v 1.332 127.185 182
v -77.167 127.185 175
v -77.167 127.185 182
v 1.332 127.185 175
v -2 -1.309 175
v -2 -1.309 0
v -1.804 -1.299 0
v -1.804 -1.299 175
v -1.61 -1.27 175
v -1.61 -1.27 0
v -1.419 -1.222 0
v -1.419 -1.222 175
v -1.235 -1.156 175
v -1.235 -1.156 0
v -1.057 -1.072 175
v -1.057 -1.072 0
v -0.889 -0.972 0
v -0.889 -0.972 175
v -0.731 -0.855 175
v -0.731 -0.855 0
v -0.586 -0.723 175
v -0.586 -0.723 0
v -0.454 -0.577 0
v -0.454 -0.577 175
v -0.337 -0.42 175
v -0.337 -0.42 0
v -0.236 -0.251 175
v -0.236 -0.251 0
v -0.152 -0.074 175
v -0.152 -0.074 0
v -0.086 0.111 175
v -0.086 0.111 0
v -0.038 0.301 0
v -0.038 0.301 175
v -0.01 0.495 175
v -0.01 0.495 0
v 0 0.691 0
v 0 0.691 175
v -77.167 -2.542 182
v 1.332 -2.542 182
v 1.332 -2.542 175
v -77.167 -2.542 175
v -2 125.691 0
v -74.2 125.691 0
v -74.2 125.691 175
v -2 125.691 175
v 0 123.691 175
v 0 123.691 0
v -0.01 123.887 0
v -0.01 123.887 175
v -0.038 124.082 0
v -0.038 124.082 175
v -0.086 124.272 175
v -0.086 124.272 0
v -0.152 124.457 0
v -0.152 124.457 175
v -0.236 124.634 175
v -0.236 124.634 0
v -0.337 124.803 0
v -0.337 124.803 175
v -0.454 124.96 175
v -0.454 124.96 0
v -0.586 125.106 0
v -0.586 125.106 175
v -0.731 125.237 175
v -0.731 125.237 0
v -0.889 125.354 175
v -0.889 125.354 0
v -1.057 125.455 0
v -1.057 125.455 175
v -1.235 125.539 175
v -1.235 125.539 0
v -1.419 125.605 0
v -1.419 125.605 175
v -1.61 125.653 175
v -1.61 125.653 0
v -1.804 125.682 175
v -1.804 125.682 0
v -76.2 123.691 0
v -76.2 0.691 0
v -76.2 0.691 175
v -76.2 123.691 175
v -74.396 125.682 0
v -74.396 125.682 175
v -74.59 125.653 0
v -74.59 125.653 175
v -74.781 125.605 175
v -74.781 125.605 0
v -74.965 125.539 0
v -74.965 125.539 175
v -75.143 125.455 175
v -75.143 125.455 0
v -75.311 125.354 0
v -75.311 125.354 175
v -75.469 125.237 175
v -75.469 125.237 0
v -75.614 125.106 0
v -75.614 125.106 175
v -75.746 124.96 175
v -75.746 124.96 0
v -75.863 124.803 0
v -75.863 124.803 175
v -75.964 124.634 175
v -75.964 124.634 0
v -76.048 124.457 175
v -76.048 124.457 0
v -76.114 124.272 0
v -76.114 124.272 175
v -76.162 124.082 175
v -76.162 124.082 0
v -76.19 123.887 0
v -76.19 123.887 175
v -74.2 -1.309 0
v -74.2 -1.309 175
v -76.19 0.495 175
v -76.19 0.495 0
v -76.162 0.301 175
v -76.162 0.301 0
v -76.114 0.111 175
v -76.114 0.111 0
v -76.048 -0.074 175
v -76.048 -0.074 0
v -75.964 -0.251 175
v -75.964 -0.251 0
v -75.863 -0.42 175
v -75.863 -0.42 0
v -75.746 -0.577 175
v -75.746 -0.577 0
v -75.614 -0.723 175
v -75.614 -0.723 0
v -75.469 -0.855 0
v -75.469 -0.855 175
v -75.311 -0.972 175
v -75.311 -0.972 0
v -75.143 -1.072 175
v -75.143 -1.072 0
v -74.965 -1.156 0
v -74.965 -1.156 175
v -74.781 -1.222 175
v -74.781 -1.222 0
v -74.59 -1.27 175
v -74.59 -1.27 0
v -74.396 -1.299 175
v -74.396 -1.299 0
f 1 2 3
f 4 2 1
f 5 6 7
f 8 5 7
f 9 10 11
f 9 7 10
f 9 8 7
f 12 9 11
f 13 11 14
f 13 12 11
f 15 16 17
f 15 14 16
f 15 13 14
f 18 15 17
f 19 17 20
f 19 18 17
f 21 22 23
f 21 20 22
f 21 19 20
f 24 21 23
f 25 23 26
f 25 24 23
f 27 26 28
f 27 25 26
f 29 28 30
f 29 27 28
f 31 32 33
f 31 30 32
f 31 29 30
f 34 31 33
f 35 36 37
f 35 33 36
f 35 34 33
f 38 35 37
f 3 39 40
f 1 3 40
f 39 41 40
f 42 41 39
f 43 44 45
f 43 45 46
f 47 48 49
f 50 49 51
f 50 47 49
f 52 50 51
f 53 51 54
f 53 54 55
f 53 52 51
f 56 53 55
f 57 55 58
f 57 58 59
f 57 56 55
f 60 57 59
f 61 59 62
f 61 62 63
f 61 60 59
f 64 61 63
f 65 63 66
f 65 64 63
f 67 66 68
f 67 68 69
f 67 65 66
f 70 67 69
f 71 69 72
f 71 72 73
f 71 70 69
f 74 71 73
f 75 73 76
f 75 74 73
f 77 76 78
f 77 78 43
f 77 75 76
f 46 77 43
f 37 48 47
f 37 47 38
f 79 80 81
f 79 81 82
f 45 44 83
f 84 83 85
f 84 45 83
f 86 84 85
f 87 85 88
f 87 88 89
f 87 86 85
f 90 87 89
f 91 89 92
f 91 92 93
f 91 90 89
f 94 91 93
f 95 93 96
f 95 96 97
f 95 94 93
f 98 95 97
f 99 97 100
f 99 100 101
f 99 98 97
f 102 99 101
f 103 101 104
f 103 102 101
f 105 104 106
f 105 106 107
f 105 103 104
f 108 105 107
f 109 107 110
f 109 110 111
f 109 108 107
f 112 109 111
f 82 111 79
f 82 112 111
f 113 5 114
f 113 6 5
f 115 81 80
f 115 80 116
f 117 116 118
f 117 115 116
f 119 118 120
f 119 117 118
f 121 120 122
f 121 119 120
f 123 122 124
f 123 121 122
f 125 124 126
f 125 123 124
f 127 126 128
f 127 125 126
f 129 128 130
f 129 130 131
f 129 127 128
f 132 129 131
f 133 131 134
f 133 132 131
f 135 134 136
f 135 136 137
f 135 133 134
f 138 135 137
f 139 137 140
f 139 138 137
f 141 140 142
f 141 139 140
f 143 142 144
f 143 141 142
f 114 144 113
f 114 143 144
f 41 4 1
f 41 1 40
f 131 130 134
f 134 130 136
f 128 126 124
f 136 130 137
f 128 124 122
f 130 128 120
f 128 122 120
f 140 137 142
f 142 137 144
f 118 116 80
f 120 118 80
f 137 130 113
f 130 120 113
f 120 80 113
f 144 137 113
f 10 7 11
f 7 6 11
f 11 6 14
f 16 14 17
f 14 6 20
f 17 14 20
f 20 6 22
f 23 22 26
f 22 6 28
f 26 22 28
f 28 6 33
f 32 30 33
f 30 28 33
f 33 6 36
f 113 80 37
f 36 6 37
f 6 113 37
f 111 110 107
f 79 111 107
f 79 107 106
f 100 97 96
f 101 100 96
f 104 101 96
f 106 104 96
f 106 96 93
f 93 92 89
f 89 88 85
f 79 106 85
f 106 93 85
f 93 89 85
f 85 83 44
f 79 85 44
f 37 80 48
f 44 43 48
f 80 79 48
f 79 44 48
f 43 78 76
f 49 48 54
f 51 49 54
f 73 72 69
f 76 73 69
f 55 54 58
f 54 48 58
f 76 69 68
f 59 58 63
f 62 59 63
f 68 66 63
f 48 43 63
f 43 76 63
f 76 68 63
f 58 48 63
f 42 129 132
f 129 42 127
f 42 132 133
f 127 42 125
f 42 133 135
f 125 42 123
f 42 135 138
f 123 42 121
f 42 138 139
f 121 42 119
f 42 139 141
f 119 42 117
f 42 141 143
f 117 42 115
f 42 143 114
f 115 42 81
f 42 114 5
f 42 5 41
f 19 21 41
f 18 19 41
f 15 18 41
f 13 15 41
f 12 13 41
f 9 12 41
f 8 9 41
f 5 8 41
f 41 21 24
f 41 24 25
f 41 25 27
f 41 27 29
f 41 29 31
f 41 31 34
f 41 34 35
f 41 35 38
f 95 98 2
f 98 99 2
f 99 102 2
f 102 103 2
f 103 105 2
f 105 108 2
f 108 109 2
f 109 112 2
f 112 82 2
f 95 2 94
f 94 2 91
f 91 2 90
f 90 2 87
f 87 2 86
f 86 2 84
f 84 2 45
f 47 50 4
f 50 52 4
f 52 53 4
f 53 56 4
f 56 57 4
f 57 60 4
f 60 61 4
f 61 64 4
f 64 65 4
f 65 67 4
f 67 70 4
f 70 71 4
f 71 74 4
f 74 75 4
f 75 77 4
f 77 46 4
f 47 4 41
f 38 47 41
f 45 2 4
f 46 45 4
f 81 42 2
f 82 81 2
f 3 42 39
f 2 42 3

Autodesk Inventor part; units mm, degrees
ref_plane "YZ Plane" through (0, 0, 0) normal (1, 0, 0) x (0, 1, 0)
ref_plane "XZ Plane" through (0, 0, 0) normal (0, 1, 0) x (-1, 0, 0)
ref_plane "XY Plane" through (0, 0, 0) normal (0, 0, 1) x (1, 0, 0)
sketch "Sketch1" plane through (0, 0, 0) normal (0, 0, 1) x (1, 0, 0)
  line L0 (0, -1.3086) -> (-76.2, -1.3086)
  line L1 (-76.2, -1.3086) -> (-76.2, 125.6914)
  line L2 (-76.2, 125.6914) -> (0, 125.6914)
  line L3 (0, 125.6914) -> (0, -1.3086)
  point P0 (0, 0)
  dimension "d0" = 76.2
  dimension "d1" = 127
extrude "Extrusion1" add sketch "Sketch1" along normal blind 175
sketch "Sketch2" plane through (0, 0, 175) normal (0, 0, 1) x (1, 0, 0)
  line L0 (-77.1669, 127.1854) -> (1.3323, 127.1854)
  line L1 (1.3323, 127.1854) -> (1.3323, -2.5417)
  line L2 (1.3323, -2.5417) -> (-77.1669, -2.5417)
  line L3 (-77.1669, -2.5417) -> (-77.1669, 127.1854)
  point P0 (0, 0)
extrude "Extrusion2" add sketch "Sketch2" along normal blind 7
fillet "Fillet1" radius 2 4 edges at (-76.2, -1.3086, 87.5) (0, -1.3086, 87.5) (-76.2, 125.6914, 87.5) (0, 125.6914, 87.5)
properties part number "jar" material "PMMA Plastic"
